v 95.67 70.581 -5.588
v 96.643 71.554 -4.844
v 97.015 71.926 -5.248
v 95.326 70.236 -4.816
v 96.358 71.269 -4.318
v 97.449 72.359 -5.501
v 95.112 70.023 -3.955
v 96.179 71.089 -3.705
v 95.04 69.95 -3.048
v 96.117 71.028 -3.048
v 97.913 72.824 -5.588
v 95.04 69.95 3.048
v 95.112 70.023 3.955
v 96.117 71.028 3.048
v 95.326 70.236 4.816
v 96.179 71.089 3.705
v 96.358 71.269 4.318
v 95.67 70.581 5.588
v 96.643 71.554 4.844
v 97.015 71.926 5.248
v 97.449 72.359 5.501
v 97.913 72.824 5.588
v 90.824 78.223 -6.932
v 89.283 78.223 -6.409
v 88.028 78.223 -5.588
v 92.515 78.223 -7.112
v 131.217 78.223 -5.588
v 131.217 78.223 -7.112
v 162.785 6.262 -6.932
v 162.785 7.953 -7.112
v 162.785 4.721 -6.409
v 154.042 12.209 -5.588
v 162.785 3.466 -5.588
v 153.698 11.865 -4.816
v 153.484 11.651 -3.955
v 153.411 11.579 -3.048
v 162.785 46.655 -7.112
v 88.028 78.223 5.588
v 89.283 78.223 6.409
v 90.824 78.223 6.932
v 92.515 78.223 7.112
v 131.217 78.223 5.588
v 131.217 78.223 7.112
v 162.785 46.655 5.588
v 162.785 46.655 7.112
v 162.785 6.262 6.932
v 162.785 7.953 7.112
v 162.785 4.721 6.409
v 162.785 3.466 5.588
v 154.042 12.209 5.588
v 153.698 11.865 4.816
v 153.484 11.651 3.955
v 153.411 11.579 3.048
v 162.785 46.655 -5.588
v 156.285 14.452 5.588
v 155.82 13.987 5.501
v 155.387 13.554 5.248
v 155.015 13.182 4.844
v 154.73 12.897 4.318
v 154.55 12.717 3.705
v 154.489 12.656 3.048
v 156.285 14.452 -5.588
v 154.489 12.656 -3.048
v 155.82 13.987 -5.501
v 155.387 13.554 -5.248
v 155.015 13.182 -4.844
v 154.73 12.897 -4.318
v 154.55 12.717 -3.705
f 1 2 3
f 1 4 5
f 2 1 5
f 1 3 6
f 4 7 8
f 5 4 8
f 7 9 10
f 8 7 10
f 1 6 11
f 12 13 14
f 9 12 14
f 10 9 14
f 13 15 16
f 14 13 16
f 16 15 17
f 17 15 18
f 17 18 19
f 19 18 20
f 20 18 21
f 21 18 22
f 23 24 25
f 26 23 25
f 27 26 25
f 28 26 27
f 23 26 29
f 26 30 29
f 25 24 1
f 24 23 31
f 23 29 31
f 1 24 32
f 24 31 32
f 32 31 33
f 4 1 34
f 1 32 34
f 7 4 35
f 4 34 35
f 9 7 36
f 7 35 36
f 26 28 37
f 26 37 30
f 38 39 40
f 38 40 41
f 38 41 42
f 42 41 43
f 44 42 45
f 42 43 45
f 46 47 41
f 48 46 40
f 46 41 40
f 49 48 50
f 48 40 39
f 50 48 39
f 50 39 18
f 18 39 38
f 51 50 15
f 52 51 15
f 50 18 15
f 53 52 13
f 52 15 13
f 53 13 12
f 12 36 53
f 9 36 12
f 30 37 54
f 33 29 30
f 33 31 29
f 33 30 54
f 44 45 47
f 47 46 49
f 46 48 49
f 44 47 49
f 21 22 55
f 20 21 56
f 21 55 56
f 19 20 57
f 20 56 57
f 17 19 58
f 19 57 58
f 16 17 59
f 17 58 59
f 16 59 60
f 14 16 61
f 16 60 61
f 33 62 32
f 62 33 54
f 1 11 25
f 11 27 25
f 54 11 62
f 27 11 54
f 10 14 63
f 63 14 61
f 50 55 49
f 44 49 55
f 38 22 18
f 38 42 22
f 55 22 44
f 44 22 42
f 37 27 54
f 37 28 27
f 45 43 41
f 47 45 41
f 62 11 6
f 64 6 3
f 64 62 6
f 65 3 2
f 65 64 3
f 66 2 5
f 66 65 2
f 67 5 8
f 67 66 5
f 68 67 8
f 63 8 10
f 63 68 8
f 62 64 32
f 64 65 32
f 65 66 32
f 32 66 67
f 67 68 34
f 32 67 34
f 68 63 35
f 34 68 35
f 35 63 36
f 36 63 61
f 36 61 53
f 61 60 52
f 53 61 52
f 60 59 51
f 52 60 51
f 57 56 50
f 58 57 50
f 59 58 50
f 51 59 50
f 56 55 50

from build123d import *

# Parameters (mm, degrees)
BOSS_EXTRUDE1_START = 6.35
BOSS_EXTRUDE1_DEPTH = 0.762
BOSS_EXTRUDE2_DEPTH = 12.7
FILLET1_R           = 2.54
FILLET2_R           = 4.064


with BuildPart() as part:
    # Sketch4 → Boss-Extrude1 (new, symmetric)
    with BuildSketch(Plane.XY.offset(BOSS_EXTRUDE1_START)):
        Polygon((86.76732538935741, 78.2227633784087), (131.2173253893574, 78.2227633784087), (162.78478969827367, 46.65529906949232), (162.78478969827367, 2.205299069492165), align=None)
    boss_extrude1 = extrude(amount=BOSS_EXTRUDE1_DEPTH, both=True)

    # Sketch5 → Boss-Extrude2 (add)
    with BuildSketch(Plane(origin=(0, 0, 5.588), x_dir=(-1, 0, 0), z_dir=(0, 0, -1))):
        Polygon((-153.41145680361603, 11.578631964150068), (-95.03979201666652, 69.95029675109956), (-96.11742275119471, 71.02792748562776), (-154.48908753814433, 12.656262698678363), align=None)
    extrude(amount=BOSS_EXTRUDE2_DEPTH)

    # Mirror2: Boss-Extrude1 across plane
    add(boss_extrude1.mirror(Plane.XY))

    # Fillet1
    fillet1_edges = [part.edges().sort_by_distance(p)[0] for p in [
        (125.30325514466952, 41.84209509215306, 5.588),
        (125.30325514466952, 41.84209509215306, -5.587999999999999),
    ]]
    fillet(fillet1_edges, radius=FILLET1_R)

    # Fillet2
    fillet2_edges = [part.edges().sort_by_distance(p)[0] for p in [
        (124.77605754381554, 40.21403122395043, 7.112),
        (124.77605754381554, 40.214031223950435, -7.112),
    ]]
    fillet(fillet2_edges, radius=FILLET2_R)


solid = part.part
